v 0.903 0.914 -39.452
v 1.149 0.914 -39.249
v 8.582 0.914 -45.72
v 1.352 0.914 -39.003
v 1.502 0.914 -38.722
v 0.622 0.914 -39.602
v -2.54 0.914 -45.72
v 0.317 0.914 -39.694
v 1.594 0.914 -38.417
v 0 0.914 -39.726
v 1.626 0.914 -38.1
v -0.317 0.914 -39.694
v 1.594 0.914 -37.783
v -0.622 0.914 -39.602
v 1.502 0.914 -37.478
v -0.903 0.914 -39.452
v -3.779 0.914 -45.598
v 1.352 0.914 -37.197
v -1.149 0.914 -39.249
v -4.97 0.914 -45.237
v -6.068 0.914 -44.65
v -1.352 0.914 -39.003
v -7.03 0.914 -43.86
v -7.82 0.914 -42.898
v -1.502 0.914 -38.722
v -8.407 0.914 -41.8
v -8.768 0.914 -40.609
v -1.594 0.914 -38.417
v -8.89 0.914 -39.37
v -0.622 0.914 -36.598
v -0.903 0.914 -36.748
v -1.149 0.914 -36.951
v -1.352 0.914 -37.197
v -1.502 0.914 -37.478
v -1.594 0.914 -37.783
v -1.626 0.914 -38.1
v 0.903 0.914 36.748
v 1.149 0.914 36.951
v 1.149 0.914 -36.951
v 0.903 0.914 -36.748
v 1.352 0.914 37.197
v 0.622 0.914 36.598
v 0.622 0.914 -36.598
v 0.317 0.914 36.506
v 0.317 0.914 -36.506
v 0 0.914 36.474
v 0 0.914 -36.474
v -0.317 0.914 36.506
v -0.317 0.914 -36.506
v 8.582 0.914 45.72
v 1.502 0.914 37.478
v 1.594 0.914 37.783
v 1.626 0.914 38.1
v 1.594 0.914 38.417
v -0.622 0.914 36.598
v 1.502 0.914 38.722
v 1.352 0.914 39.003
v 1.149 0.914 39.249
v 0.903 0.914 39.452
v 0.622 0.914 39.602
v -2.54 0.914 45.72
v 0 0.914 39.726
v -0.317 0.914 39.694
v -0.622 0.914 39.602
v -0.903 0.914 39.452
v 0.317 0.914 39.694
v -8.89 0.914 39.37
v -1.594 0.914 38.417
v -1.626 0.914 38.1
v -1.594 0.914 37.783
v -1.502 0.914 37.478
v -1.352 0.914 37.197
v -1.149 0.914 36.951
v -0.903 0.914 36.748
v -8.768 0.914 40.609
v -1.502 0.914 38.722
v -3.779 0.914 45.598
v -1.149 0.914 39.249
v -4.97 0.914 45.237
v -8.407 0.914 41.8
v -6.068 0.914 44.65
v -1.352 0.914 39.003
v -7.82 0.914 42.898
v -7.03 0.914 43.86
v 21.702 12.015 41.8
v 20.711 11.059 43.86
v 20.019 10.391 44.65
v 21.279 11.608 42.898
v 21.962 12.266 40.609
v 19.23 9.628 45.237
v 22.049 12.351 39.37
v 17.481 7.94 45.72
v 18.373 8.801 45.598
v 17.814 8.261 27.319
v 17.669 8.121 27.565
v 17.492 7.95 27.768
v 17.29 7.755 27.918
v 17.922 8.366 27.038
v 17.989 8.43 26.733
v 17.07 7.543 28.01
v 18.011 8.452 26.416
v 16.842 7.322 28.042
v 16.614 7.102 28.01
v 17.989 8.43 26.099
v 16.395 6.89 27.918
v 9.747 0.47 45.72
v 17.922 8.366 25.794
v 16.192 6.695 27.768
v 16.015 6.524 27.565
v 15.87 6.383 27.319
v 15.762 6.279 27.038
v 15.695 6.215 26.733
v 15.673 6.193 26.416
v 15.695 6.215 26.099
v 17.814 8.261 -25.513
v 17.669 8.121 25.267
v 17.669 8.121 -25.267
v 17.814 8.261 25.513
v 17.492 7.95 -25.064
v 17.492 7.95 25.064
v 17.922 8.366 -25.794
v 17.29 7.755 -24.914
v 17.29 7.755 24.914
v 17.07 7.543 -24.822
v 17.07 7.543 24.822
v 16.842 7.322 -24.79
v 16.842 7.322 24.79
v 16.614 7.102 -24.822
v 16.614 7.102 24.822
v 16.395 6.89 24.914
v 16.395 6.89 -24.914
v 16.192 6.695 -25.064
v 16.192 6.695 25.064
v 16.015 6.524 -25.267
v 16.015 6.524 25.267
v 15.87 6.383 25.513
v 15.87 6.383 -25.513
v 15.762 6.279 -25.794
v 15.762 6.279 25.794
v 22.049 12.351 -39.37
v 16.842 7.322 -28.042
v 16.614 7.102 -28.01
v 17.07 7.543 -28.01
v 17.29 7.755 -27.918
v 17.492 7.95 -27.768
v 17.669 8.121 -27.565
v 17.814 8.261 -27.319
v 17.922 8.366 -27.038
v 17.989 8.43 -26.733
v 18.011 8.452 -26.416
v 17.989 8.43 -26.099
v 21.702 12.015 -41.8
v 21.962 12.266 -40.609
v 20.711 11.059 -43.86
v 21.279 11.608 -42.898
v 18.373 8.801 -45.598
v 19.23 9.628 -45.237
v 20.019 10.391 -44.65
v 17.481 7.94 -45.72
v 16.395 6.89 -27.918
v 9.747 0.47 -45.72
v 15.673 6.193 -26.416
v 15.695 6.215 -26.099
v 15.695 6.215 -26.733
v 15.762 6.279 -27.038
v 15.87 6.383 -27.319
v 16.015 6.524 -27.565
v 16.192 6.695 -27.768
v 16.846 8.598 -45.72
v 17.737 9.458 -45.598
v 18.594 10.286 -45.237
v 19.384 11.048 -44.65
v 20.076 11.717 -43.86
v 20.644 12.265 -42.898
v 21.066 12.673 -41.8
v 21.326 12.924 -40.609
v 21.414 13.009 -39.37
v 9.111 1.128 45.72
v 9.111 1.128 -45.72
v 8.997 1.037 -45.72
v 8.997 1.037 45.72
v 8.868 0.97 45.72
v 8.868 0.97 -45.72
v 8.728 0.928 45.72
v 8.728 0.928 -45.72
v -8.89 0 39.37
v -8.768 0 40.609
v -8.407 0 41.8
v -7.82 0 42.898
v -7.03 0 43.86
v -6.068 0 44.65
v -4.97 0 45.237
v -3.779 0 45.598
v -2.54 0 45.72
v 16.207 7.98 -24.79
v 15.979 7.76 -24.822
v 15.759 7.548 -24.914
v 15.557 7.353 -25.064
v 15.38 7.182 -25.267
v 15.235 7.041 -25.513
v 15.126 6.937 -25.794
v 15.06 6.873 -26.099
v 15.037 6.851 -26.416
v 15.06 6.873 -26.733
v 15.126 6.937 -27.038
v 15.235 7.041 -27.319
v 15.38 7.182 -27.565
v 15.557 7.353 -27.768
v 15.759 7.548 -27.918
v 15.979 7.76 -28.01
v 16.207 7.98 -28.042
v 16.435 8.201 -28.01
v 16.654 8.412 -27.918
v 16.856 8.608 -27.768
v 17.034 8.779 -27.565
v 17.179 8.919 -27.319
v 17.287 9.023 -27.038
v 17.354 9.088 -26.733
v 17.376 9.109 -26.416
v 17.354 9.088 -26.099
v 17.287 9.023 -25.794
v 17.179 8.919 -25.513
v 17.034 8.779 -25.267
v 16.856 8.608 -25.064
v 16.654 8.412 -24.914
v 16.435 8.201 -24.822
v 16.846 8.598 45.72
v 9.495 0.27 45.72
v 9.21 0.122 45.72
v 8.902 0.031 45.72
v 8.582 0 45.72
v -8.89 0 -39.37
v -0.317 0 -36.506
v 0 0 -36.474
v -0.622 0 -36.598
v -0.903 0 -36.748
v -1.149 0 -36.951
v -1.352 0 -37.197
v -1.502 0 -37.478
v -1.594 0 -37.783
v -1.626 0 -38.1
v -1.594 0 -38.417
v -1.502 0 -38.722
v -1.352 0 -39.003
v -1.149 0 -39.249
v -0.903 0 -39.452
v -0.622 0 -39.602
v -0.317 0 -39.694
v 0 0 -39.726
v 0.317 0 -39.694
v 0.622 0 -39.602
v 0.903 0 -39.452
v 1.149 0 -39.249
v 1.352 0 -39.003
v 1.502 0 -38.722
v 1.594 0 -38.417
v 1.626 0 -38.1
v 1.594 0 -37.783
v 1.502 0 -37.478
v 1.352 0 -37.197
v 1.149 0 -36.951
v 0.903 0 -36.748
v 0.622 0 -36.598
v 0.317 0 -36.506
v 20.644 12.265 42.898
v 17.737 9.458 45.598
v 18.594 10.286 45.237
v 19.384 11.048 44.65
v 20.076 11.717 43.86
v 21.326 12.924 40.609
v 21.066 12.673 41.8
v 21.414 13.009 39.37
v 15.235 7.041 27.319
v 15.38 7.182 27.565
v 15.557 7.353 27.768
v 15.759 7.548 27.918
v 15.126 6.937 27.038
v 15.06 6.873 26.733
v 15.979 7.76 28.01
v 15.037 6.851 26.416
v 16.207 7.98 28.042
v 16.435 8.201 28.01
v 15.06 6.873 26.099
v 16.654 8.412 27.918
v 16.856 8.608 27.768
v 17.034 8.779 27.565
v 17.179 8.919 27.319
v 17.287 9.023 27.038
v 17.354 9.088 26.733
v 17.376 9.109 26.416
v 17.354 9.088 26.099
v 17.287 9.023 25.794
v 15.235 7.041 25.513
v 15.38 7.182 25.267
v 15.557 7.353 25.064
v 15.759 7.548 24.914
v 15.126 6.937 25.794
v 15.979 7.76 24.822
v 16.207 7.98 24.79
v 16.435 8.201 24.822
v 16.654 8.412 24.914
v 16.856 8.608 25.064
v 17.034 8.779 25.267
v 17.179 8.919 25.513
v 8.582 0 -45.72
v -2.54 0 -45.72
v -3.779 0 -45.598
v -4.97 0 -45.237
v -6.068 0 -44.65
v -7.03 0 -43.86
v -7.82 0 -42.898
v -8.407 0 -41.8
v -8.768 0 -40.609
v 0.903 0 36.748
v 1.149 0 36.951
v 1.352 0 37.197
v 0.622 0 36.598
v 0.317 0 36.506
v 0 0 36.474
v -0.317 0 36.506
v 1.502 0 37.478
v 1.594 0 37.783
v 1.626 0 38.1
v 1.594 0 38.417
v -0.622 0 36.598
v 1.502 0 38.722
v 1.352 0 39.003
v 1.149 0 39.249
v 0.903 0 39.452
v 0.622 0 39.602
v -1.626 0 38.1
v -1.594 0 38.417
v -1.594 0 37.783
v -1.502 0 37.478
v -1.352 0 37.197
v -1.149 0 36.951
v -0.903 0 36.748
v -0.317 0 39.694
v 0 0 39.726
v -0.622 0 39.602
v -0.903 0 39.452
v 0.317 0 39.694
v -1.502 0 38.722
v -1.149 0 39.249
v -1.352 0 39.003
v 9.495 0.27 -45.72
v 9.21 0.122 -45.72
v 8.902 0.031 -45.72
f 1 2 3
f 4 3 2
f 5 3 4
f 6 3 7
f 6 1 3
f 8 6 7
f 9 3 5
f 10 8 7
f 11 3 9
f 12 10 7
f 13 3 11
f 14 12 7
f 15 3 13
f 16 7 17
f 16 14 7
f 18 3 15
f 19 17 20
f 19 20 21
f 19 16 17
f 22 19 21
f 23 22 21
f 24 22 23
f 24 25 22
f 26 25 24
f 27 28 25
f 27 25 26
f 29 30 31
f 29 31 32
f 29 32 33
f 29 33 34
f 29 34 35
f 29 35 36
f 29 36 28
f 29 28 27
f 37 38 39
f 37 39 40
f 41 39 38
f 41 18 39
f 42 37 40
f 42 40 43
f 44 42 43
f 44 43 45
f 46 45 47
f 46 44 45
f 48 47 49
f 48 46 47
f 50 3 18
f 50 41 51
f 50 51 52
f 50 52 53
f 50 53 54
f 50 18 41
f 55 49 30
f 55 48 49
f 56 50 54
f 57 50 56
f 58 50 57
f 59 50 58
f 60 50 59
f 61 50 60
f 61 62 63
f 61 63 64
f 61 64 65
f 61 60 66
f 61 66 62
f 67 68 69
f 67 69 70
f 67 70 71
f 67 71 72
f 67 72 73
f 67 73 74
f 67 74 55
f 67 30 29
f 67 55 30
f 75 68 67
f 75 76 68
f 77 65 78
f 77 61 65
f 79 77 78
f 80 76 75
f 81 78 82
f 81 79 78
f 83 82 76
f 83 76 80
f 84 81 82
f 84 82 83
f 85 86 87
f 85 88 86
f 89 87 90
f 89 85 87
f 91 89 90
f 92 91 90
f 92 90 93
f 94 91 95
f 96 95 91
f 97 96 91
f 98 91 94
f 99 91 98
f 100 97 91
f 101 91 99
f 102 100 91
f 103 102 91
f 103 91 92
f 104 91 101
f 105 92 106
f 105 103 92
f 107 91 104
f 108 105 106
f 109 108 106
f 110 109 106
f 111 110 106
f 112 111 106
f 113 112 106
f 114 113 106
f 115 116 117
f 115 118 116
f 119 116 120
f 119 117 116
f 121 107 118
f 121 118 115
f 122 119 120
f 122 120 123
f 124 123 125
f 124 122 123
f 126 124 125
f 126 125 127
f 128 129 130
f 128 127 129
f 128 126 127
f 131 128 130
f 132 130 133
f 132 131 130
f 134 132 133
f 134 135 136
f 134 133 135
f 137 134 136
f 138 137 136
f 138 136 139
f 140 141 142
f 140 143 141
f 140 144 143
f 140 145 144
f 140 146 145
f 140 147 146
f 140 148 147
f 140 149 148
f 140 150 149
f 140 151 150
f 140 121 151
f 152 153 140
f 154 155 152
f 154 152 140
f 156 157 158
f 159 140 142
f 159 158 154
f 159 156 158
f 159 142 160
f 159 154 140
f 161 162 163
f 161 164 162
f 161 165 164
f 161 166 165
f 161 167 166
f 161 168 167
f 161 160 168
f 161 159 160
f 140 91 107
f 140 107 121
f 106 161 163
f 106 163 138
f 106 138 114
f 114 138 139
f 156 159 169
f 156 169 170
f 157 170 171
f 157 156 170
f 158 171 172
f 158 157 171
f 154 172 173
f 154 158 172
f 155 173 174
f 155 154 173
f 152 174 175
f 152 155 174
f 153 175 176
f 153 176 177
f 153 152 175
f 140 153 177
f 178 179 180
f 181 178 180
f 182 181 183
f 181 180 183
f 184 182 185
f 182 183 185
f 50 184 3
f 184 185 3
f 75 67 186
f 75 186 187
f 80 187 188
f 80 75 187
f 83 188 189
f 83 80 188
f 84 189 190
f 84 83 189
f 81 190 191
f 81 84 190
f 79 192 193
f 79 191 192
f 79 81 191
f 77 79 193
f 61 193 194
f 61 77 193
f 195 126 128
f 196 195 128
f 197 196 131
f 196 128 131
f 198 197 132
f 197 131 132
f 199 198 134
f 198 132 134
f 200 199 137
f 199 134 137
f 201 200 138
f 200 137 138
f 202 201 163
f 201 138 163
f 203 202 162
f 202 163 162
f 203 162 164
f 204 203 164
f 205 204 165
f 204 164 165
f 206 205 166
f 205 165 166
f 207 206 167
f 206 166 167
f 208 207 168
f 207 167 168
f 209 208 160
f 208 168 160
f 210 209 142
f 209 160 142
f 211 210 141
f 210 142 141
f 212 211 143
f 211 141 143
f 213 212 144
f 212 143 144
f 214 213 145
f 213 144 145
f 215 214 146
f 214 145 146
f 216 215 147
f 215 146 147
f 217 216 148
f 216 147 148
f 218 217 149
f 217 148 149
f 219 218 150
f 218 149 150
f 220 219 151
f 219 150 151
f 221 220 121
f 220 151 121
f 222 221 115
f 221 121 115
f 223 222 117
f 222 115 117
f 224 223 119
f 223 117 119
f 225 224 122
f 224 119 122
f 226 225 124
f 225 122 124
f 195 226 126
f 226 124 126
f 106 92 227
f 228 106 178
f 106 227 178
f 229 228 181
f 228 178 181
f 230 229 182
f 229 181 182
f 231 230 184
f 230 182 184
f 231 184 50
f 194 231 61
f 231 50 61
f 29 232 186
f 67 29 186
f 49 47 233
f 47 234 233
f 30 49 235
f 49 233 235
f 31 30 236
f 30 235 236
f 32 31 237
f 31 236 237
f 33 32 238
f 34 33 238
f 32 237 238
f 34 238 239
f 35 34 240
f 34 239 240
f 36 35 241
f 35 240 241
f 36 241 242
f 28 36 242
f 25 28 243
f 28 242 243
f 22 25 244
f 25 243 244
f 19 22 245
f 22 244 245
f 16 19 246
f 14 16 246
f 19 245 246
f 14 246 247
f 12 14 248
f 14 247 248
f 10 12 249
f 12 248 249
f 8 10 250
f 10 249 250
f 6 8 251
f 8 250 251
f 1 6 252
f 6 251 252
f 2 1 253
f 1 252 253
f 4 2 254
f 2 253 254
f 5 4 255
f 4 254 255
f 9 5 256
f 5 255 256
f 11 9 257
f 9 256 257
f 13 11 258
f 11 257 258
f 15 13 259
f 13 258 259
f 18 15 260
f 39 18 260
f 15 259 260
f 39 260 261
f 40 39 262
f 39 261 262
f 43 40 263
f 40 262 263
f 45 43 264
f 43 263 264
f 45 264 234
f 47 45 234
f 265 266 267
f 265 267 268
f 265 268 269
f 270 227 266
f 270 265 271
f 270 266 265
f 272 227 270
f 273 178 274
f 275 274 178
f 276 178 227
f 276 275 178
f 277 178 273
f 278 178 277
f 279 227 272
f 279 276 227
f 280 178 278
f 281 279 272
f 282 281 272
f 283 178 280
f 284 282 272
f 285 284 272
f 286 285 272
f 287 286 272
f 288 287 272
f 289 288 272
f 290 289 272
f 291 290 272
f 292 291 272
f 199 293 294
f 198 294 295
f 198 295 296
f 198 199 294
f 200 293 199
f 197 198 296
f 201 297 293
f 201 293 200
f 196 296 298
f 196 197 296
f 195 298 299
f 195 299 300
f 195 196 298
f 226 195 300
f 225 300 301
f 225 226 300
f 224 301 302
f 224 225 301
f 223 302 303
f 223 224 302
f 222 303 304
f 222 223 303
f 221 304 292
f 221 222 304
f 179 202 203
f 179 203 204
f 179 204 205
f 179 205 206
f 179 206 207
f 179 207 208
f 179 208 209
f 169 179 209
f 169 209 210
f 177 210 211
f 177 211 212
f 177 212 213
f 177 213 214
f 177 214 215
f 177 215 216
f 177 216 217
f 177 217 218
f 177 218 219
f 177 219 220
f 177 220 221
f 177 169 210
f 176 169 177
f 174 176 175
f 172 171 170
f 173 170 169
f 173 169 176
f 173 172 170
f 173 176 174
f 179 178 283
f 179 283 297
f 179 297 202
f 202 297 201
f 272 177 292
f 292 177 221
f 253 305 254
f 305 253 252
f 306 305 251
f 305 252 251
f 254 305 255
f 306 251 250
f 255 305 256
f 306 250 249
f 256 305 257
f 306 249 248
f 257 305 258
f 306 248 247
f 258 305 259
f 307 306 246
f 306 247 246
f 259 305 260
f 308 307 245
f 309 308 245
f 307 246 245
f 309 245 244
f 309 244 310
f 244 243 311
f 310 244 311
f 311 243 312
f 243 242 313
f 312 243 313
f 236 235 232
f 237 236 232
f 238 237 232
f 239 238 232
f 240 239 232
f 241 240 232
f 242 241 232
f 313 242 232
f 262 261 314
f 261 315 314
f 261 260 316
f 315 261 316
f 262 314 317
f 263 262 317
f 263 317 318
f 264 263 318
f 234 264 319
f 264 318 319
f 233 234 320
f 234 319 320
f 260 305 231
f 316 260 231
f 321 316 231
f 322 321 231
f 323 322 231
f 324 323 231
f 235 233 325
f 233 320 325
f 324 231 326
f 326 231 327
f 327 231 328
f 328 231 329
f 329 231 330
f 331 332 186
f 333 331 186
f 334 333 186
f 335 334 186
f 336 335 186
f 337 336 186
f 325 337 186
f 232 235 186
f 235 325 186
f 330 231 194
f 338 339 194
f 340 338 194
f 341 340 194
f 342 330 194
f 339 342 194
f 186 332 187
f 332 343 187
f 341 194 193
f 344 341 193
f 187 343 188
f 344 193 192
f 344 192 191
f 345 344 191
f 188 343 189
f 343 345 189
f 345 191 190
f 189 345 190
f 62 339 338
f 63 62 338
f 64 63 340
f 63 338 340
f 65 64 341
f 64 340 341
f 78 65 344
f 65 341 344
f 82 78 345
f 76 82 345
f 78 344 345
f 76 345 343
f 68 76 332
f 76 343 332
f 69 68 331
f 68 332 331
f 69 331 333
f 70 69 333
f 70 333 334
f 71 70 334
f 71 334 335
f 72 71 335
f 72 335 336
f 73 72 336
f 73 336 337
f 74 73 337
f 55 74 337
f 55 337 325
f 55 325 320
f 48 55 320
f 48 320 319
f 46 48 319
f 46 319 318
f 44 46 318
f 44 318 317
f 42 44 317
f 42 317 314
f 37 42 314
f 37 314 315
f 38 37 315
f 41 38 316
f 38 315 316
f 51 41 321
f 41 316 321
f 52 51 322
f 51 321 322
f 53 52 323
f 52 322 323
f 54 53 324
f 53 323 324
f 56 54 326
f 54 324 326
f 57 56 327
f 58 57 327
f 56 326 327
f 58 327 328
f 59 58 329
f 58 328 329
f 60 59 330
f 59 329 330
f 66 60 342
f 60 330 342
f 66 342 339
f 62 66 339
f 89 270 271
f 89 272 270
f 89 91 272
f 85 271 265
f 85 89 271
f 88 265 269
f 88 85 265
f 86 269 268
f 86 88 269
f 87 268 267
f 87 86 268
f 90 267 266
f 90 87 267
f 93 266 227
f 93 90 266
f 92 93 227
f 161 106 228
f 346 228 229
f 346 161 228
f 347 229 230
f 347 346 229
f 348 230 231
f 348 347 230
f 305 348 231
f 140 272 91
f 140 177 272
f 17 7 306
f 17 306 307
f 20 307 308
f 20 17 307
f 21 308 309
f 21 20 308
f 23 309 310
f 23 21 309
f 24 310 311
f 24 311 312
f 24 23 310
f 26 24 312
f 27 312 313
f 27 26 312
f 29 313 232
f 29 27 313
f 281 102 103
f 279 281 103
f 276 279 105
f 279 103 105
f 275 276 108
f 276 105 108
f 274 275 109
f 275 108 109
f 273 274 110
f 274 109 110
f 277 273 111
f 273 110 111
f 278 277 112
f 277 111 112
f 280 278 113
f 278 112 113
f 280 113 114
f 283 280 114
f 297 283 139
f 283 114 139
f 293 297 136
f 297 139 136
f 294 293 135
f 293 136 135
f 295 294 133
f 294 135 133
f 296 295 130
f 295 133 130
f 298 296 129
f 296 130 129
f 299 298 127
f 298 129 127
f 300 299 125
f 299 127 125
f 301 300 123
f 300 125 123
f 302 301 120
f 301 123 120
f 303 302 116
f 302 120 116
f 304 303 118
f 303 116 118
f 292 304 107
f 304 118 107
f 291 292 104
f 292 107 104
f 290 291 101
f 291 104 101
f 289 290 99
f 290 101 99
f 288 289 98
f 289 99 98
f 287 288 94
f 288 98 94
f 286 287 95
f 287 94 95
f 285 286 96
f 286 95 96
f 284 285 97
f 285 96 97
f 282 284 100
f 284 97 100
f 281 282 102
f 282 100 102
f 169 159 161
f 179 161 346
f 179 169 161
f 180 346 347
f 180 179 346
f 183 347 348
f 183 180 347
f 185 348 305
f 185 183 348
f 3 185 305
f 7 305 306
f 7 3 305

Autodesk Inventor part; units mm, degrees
ref_plane "YZ Plane" through (0, 0, 0) normal (1, 0, 0) x (0, 1, 0)
ref_plane "XZ Plane" through (0, 0, 0) normal (0, 1, 0) x (-1, 0, 0)
ref_plane "XY Plane" through (0, 0, 0) normal (0, 0, 1) x (1, 0, 0)
sketch "Sketch1" plane through (0, 0, 0) normal (0, 1, 0) x (-1, 0, 0)
  line L0 (-8.89, -45.72) -> (8.89, -45.72)
  line L1 (8.89, -45.72) -> (8.89, 45.72)
  line L2 (8.89, 45.72) -> (-8.89, 45.72)
  line L3 (-8.89, 45.72) -> (-8.89, -45.72)
  line L4 (-8.89, -45.72) -> (8.89, 45.72) construction
  line L5 (8.89, -45.72) -> (-8.89, 45.72) construction
  point P0 (0, 0)
  dimension "d0" = 17.78
  dimension "d1" = 91.44
extrude "Plate1" add sketch "Sketch1" along normal blind 0.9144
sketch "Sketch2" plane through (8.89, 0.9144, -45.72) normal (0.6946584, -0.7193398, 0) x (0.7193398, 0.6946584, 0)
  line L0 (0, 91.44) -> (0, 0)
  line L1 (0, 0) -> (17.4106, 0)
  line L2 (17.4106, 0) -> (17.4106, 91.44)
  line L3 (17.4106, 91.44) -> (0, 91.44)
edge flange "Flange1" height 17.78 angle 44 thickness 0.9144 bend radius 0.762 thickness toward (0.6946584, -0.7193398, 0) relief tear relief width 0.9144 relief depth 0.4572 edges at (8.89, 0.9144, 0) wall of the first edge with corners at (8.89, 0.9144, 45.72) (8.89, 0.9144, -45.72) (21.4141, 13.0088, -45.72) (21.4141, 13.0088, 45.72)
bend "Bend1"
corner "Corner1"
sketch "Sketch3" plane through (0, 0.9144, 0) normal (0, 1, 0) x (1, 0, 0)
  line L0 (-14.9938, 0) -> (27.733, 0) projected
  line L1 (-8.89, -45.72) -> (-8.89, 45.72) projected
  point P0 (0, 0)
  point P1 (0, 38.1)
  point P2 (0, -38.1)
  dimension "d13" = 76.2
  dimension "d14" = 8.89
hole "Hole1" at (0, 0.9144, -38.1) at (0, 0.9144, 38.1) direction (0, -1, 0) diameter 3.2512 end through all
sketch "Sketch4" plane through (21.4141, 13.0088, -45.72) normal (-0.6946584, 0.7193398, 0) x (0, 0, 1)
  line L0 (91.44, 0) -> (0, 0) projected
  line L1 (45.72, -40.2779) -> (45.72, 7.2461) projected
  point P0 (45.72, -24.4407)
  point P1 (19.304, -7.239)
  point P2 (72.136, -7.239)
  dimension "d22" = 7.239
  dimension "d23" = 52.832
hole "Hole2" at (16.2068, 7.9802, -26.416) at (16.2068, 7.9802, 26.416) direction (0.6946584, -0.7193398, 0) diameter 3.2512 end through all
fillet "Corner Round1" radius 6.35 4 edges at (-8.89, 0.4572, 45.72) (21.7317, 12.6799, -45.72) (-8.89, 0.4572, -45.72) (21.7317, 12.6799, 45.72)
equation "\"d20\" = Thickness"
equation "\"d29\" = Thickness"
equation "\"d2\" = Thickness"
equation "\"d3\" = BendReliefWidth"
equation "\"d4\" = BendReliefDepth"
equation "\"d5\" = MinimumRemnant"
equation "\"d6\" = TransitionRadius"
equation "\"d9\" = BendRadius"
equation "\"d10\" = CornerReliefSize"
equation "\"d11\" = GapSize"
equation "\"d12\" = JacobiRadiusSize"
equation "\"BendReliefWidth\" = Thickness"
equation "\"BendReliefDepth\" = 0.5 * Thickness"
equation "\"CornerReliefSize\" = 4 * Thickness"
equation "\"MinimumRemnant\" = 2 * Thickness"
equation "\"TransitionRadius\" = BendRadius"
equation "\"JacobiRadiusSize\" = BendRadius"
equation "\"GapSize\" = Thickness"
equation "\"Thickness\" = 0.9144"
equation "\"BendRadius\" = 0.762"
properties part number "J009600" material "STAINLESS STEEL, 316"
